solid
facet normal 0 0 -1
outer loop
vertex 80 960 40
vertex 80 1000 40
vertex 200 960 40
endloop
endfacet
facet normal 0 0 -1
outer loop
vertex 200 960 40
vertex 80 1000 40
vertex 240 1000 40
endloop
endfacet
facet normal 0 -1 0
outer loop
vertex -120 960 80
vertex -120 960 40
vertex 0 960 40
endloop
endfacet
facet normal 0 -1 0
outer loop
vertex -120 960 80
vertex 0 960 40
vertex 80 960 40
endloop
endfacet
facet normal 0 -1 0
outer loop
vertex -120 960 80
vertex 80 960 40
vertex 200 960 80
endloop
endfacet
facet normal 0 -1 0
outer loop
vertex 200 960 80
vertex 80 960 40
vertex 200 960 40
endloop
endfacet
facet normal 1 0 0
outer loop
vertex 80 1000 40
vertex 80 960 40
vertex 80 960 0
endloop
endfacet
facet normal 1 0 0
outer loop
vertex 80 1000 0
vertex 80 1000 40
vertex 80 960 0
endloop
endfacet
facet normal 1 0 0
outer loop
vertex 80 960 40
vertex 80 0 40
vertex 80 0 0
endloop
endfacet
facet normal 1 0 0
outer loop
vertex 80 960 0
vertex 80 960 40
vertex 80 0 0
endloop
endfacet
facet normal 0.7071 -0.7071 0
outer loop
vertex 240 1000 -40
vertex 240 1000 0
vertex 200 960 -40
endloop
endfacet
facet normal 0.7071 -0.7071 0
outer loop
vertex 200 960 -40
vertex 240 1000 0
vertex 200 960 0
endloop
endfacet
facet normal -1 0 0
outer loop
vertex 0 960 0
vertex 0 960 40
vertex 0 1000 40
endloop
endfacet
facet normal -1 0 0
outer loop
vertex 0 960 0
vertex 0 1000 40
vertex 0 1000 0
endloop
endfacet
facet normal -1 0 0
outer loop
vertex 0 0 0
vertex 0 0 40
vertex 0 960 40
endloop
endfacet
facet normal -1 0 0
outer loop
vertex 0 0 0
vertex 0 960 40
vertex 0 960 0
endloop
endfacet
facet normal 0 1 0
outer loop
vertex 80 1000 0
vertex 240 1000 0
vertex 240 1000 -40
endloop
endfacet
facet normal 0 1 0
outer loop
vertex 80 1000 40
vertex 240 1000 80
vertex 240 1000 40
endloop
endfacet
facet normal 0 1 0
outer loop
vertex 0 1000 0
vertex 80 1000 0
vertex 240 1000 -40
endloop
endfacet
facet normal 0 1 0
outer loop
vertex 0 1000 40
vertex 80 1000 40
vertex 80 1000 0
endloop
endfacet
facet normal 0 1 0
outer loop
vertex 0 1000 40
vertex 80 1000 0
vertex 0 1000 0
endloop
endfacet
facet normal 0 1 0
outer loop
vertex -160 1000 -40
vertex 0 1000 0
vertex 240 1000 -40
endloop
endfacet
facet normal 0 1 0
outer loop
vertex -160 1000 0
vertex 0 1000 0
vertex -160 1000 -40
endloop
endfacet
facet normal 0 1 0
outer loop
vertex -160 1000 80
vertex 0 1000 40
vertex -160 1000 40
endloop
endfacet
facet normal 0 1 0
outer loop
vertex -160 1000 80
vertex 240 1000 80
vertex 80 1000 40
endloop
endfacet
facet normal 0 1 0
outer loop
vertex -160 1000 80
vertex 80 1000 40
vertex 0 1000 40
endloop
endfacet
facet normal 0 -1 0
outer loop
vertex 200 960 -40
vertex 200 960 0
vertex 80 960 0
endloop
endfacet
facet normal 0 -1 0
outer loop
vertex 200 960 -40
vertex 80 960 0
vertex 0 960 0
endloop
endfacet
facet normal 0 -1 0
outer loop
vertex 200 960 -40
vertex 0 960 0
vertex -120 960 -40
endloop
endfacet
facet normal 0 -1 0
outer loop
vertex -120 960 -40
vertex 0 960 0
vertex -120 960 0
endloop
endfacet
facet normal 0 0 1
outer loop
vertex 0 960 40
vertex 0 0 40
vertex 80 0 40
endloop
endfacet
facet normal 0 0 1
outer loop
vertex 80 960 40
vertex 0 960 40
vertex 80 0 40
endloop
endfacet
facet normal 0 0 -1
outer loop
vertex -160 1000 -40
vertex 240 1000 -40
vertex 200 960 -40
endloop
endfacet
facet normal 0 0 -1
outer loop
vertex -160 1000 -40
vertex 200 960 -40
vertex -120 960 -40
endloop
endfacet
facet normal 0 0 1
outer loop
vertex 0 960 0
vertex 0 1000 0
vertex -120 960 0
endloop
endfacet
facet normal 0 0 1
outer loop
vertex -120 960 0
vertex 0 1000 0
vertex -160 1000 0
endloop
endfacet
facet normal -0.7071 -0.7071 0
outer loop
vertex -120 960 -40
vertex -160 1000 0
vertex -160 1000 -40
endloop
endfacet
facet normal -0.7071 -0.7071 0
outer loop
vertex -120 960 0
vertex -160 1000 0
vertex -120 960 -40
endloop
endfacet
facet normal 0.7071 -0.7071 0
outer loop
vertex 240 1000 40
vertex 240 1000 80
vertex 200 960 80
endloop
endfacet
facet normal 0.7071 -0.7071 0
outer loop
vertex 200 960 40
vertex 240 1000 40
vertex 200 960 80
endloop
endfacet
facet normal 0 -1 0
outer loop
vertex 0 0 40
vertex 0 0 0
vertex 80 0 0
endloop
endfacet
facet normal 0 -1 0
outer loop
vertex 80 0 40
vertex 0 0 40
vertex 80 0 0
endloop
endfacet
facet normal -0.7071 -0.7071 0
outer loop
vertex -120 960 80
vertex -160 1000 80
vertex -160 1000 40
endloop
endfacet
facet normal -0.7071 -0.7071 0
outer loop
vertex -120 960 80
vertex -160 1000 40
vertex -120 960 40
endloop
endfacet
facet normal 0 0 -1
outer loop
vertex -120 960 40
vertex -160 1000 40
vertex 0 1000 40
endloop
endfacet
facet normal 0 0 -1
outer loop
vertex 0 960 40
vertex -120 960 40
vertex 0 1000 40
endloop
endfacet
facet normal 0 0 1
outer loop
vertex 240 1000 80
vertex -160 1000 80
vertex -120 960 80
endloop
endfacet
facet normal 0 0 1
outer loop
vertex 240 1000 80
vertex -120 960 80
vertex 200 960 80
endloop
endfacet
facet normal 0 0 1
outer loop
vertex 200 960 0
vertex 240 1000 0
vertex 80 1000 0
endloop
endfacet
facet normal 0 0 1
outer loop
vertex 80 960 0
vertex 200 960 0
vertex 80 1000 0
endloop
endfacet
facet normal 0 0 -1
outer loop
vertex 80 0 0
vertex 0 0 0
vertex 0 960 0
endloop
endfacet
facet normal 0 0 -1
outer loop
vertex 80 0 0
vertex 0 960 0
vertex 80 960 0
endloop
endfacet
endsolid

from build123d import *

# Parameters (mm, degrees)
SKETCH_1_W          = 80
SKETCH_1_H          = 40
EXTRUDE_1_DEPTH     = 1000
SKETCH_2_W          = 400
SKETCH_2_H          = 40
EXTRUDE_2_DEPTH     = 40
SKETCH_3_W          = 400
SKETCH_3_H          = 40
EXTRUDE_3_DEPTH     = 40
CUT_EXTRUDE_1_DEPTH = 121


with BuildPart() as part:
    # 草图1 → 凸台-拉伸1 (new body)
    with BuildSketch(Plane(origin=(0, 0, 0), x_dir=(1, 0, 0), z_dir=(0, 1, 0))):
        with Locations((40, -20)):
            Rectangle(SKETCH_1_W, SKETCH_1_H)
    extrude(amount=EXTRUDE_1_DEPTH)

    # 草图2 → 凸台-拉伸2 (add)
    with BuildSketch(Plane.XY.offset(40)):
        with Locations((40, 980)):
            Rectangle(SKETCH_2_W, SKETCH_2_H)
    extrude(amount=EXTRUDE_2_DEPTH)

    # 草图3 → 凸台-拉伸3 (add)
    with BuildSketch(Plane(origin=(0, 0, 0), x_dir=(-1, 0, 0), z_dir=(0, 0, -1))):
        with Locations((-40, 980)):
            Rectangle(SKETCH_3_W, SKETCH_3_H)
    extrude(amount=EXTRUDE_3_DEPTH)

    # 草图4 → 切除-拉伸1 (cut, through all)
    with BuildSketch(Plane.XY.offset(80)):
        Polygon((-160, 1000), (-120, 960), (-160, 960), align=None)
        Polygon((240, 1000), (200, 960), (240, 960), align=None)
    extrude(amount=-CUT_EXTRUDE_1_DEPTH, mode=Mode.SUBTRACT)


solid = part.part
